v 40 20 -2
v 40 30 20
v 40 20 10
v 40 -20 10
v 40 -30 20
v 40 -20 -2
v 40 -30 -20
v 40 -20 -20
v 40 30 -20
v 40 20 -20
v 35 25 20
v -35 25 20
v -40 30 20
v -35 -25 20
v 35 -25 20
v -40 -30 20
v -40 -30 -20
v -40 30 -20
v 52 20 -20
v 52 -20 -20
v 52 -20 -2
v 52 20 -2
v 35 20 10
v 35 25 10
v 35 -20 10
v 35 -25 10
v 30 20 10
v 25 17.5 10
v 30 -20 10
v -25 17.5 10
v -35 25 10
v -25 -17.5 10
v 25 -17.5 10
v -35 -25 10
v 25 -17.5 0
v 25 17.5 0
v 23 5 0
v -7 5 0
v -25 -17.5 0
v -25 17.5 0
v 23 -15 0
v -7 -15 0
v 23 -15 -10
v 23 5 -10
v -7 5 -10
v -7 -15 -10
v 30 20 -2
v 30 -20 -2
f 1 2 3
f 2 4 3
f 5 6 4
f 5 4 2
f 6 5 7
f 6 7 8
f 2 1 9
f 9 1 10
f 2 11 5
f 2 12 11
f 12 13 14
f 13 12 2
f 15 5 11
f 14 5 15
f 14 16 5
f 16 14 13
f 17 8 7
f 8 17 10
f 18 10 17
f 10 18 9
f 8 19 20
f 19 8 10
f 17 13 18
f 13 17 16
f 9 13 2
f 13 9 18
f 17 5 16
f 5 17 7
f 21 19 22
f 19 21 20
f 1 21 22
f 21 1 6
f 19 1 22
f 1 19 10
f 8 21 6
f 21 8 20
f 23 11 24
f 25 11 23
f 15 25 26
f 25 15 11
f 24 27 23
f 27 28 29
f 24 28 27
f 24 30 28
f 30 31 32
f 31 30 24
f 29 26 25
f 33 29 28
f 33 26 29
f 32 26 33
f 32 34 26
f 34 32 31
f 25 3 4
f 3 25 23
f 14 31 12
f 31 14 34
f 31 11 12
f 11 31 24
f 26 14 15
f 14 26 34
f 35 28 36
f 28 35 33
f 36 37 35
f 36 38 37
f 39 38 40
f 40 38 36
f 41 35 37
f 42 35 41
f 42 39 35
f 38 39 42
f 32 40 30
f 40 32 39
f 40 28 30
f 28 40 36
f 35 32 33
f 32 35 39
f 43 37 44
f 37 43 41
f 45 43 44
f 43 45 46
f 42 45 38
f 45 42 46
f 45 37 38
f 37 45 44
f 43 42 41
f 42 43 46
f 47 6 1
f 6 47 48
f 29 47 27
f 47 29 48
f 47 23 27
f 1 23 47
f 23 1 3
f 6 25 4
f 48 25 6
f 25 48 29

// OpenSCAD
// ==========================================
// Parametric Stepped Cavity Block with Side Features
// ==========================================

// Global resolution for smooth rendering
$fn = 100;

// --- Main Block Dimensions ---
main_width  = 80;
main_depth  = 60;
main_height = 40;

// --- Top Stepped Cavity Parameters ---
// Step 1: Broad upper recess (leaves thin outer rim)
step1_w     = 70;
step1_d     = 50;
step1_depth = 10;

// Step 2: Middle inset recess
step2_w     = 50;
step2_d     = 35;
step2_depth = 20;

// Step 3: Deepest shifted pocket
step3_w     = 30;
step3_d     = 20;
step3_depth = 30;
step3_off_x = 8;   // X-shift creates uneven interior ledges
step3_off_y = -5;  // Y-shift

// --- Side Projection Parameters ---
proj_width  = 12;
proj_depth  = 40;
proj_height = 18;

// --- Side Recess Parameters (above projection) ---
rec_depth   = 10;
rec_width   = 40;
rec_height  = 12;

// ==========================================
// Module Definitions
// ==========================================

// Base solid: combines main block and side projection
module base_geometry() {
    union() {
        // Main rectangular solid
        cube([main_width, main_depth, main_height], center=true);

        // Side projection attached to the +X face
        translate([main_width/2 + proj_width/2, 0, -main_height/2 + proj_height/2])
            cube([proj_width, proj_depth, proj_height], center=true);
    }
}

// Top nested stepped cavities (subtractive volumes)
module top_cavities() {
    // Upper recess cut
    translate([0, 0, main_height/2 - step1_depth/2])
        cube([step1_w, step1_d, step1_depth], center=true);

    // Middle inset cut
    translate([0, 0, main_height/2 - step2_depth/2])
        cube([step2_w, step2_d, step2_depth], center=true);

    // Deepest shifted pocket cut
    translate([step3_off_x, step3_off_y, main_height/2 - step3_depth/2])
        cube([step3_w, step3_d, step3_depth], center=true);
}

// Side recess cut positioned directly above the projection
module side_recess_cut() {
    translate([main_width/2 - rec_depth/2, 0, -main_height/2 + proj_height + rec_height/2])
        cube([rec_depth, rec_width, rec_height], center=true);
}

// ==========================================
// Final Assembly
// ==========================================

// Start with base geometry, subtract top cavities and side recess
difference() {
    base_geometry();
    top_cavities();
    side_recess_cut();
}
